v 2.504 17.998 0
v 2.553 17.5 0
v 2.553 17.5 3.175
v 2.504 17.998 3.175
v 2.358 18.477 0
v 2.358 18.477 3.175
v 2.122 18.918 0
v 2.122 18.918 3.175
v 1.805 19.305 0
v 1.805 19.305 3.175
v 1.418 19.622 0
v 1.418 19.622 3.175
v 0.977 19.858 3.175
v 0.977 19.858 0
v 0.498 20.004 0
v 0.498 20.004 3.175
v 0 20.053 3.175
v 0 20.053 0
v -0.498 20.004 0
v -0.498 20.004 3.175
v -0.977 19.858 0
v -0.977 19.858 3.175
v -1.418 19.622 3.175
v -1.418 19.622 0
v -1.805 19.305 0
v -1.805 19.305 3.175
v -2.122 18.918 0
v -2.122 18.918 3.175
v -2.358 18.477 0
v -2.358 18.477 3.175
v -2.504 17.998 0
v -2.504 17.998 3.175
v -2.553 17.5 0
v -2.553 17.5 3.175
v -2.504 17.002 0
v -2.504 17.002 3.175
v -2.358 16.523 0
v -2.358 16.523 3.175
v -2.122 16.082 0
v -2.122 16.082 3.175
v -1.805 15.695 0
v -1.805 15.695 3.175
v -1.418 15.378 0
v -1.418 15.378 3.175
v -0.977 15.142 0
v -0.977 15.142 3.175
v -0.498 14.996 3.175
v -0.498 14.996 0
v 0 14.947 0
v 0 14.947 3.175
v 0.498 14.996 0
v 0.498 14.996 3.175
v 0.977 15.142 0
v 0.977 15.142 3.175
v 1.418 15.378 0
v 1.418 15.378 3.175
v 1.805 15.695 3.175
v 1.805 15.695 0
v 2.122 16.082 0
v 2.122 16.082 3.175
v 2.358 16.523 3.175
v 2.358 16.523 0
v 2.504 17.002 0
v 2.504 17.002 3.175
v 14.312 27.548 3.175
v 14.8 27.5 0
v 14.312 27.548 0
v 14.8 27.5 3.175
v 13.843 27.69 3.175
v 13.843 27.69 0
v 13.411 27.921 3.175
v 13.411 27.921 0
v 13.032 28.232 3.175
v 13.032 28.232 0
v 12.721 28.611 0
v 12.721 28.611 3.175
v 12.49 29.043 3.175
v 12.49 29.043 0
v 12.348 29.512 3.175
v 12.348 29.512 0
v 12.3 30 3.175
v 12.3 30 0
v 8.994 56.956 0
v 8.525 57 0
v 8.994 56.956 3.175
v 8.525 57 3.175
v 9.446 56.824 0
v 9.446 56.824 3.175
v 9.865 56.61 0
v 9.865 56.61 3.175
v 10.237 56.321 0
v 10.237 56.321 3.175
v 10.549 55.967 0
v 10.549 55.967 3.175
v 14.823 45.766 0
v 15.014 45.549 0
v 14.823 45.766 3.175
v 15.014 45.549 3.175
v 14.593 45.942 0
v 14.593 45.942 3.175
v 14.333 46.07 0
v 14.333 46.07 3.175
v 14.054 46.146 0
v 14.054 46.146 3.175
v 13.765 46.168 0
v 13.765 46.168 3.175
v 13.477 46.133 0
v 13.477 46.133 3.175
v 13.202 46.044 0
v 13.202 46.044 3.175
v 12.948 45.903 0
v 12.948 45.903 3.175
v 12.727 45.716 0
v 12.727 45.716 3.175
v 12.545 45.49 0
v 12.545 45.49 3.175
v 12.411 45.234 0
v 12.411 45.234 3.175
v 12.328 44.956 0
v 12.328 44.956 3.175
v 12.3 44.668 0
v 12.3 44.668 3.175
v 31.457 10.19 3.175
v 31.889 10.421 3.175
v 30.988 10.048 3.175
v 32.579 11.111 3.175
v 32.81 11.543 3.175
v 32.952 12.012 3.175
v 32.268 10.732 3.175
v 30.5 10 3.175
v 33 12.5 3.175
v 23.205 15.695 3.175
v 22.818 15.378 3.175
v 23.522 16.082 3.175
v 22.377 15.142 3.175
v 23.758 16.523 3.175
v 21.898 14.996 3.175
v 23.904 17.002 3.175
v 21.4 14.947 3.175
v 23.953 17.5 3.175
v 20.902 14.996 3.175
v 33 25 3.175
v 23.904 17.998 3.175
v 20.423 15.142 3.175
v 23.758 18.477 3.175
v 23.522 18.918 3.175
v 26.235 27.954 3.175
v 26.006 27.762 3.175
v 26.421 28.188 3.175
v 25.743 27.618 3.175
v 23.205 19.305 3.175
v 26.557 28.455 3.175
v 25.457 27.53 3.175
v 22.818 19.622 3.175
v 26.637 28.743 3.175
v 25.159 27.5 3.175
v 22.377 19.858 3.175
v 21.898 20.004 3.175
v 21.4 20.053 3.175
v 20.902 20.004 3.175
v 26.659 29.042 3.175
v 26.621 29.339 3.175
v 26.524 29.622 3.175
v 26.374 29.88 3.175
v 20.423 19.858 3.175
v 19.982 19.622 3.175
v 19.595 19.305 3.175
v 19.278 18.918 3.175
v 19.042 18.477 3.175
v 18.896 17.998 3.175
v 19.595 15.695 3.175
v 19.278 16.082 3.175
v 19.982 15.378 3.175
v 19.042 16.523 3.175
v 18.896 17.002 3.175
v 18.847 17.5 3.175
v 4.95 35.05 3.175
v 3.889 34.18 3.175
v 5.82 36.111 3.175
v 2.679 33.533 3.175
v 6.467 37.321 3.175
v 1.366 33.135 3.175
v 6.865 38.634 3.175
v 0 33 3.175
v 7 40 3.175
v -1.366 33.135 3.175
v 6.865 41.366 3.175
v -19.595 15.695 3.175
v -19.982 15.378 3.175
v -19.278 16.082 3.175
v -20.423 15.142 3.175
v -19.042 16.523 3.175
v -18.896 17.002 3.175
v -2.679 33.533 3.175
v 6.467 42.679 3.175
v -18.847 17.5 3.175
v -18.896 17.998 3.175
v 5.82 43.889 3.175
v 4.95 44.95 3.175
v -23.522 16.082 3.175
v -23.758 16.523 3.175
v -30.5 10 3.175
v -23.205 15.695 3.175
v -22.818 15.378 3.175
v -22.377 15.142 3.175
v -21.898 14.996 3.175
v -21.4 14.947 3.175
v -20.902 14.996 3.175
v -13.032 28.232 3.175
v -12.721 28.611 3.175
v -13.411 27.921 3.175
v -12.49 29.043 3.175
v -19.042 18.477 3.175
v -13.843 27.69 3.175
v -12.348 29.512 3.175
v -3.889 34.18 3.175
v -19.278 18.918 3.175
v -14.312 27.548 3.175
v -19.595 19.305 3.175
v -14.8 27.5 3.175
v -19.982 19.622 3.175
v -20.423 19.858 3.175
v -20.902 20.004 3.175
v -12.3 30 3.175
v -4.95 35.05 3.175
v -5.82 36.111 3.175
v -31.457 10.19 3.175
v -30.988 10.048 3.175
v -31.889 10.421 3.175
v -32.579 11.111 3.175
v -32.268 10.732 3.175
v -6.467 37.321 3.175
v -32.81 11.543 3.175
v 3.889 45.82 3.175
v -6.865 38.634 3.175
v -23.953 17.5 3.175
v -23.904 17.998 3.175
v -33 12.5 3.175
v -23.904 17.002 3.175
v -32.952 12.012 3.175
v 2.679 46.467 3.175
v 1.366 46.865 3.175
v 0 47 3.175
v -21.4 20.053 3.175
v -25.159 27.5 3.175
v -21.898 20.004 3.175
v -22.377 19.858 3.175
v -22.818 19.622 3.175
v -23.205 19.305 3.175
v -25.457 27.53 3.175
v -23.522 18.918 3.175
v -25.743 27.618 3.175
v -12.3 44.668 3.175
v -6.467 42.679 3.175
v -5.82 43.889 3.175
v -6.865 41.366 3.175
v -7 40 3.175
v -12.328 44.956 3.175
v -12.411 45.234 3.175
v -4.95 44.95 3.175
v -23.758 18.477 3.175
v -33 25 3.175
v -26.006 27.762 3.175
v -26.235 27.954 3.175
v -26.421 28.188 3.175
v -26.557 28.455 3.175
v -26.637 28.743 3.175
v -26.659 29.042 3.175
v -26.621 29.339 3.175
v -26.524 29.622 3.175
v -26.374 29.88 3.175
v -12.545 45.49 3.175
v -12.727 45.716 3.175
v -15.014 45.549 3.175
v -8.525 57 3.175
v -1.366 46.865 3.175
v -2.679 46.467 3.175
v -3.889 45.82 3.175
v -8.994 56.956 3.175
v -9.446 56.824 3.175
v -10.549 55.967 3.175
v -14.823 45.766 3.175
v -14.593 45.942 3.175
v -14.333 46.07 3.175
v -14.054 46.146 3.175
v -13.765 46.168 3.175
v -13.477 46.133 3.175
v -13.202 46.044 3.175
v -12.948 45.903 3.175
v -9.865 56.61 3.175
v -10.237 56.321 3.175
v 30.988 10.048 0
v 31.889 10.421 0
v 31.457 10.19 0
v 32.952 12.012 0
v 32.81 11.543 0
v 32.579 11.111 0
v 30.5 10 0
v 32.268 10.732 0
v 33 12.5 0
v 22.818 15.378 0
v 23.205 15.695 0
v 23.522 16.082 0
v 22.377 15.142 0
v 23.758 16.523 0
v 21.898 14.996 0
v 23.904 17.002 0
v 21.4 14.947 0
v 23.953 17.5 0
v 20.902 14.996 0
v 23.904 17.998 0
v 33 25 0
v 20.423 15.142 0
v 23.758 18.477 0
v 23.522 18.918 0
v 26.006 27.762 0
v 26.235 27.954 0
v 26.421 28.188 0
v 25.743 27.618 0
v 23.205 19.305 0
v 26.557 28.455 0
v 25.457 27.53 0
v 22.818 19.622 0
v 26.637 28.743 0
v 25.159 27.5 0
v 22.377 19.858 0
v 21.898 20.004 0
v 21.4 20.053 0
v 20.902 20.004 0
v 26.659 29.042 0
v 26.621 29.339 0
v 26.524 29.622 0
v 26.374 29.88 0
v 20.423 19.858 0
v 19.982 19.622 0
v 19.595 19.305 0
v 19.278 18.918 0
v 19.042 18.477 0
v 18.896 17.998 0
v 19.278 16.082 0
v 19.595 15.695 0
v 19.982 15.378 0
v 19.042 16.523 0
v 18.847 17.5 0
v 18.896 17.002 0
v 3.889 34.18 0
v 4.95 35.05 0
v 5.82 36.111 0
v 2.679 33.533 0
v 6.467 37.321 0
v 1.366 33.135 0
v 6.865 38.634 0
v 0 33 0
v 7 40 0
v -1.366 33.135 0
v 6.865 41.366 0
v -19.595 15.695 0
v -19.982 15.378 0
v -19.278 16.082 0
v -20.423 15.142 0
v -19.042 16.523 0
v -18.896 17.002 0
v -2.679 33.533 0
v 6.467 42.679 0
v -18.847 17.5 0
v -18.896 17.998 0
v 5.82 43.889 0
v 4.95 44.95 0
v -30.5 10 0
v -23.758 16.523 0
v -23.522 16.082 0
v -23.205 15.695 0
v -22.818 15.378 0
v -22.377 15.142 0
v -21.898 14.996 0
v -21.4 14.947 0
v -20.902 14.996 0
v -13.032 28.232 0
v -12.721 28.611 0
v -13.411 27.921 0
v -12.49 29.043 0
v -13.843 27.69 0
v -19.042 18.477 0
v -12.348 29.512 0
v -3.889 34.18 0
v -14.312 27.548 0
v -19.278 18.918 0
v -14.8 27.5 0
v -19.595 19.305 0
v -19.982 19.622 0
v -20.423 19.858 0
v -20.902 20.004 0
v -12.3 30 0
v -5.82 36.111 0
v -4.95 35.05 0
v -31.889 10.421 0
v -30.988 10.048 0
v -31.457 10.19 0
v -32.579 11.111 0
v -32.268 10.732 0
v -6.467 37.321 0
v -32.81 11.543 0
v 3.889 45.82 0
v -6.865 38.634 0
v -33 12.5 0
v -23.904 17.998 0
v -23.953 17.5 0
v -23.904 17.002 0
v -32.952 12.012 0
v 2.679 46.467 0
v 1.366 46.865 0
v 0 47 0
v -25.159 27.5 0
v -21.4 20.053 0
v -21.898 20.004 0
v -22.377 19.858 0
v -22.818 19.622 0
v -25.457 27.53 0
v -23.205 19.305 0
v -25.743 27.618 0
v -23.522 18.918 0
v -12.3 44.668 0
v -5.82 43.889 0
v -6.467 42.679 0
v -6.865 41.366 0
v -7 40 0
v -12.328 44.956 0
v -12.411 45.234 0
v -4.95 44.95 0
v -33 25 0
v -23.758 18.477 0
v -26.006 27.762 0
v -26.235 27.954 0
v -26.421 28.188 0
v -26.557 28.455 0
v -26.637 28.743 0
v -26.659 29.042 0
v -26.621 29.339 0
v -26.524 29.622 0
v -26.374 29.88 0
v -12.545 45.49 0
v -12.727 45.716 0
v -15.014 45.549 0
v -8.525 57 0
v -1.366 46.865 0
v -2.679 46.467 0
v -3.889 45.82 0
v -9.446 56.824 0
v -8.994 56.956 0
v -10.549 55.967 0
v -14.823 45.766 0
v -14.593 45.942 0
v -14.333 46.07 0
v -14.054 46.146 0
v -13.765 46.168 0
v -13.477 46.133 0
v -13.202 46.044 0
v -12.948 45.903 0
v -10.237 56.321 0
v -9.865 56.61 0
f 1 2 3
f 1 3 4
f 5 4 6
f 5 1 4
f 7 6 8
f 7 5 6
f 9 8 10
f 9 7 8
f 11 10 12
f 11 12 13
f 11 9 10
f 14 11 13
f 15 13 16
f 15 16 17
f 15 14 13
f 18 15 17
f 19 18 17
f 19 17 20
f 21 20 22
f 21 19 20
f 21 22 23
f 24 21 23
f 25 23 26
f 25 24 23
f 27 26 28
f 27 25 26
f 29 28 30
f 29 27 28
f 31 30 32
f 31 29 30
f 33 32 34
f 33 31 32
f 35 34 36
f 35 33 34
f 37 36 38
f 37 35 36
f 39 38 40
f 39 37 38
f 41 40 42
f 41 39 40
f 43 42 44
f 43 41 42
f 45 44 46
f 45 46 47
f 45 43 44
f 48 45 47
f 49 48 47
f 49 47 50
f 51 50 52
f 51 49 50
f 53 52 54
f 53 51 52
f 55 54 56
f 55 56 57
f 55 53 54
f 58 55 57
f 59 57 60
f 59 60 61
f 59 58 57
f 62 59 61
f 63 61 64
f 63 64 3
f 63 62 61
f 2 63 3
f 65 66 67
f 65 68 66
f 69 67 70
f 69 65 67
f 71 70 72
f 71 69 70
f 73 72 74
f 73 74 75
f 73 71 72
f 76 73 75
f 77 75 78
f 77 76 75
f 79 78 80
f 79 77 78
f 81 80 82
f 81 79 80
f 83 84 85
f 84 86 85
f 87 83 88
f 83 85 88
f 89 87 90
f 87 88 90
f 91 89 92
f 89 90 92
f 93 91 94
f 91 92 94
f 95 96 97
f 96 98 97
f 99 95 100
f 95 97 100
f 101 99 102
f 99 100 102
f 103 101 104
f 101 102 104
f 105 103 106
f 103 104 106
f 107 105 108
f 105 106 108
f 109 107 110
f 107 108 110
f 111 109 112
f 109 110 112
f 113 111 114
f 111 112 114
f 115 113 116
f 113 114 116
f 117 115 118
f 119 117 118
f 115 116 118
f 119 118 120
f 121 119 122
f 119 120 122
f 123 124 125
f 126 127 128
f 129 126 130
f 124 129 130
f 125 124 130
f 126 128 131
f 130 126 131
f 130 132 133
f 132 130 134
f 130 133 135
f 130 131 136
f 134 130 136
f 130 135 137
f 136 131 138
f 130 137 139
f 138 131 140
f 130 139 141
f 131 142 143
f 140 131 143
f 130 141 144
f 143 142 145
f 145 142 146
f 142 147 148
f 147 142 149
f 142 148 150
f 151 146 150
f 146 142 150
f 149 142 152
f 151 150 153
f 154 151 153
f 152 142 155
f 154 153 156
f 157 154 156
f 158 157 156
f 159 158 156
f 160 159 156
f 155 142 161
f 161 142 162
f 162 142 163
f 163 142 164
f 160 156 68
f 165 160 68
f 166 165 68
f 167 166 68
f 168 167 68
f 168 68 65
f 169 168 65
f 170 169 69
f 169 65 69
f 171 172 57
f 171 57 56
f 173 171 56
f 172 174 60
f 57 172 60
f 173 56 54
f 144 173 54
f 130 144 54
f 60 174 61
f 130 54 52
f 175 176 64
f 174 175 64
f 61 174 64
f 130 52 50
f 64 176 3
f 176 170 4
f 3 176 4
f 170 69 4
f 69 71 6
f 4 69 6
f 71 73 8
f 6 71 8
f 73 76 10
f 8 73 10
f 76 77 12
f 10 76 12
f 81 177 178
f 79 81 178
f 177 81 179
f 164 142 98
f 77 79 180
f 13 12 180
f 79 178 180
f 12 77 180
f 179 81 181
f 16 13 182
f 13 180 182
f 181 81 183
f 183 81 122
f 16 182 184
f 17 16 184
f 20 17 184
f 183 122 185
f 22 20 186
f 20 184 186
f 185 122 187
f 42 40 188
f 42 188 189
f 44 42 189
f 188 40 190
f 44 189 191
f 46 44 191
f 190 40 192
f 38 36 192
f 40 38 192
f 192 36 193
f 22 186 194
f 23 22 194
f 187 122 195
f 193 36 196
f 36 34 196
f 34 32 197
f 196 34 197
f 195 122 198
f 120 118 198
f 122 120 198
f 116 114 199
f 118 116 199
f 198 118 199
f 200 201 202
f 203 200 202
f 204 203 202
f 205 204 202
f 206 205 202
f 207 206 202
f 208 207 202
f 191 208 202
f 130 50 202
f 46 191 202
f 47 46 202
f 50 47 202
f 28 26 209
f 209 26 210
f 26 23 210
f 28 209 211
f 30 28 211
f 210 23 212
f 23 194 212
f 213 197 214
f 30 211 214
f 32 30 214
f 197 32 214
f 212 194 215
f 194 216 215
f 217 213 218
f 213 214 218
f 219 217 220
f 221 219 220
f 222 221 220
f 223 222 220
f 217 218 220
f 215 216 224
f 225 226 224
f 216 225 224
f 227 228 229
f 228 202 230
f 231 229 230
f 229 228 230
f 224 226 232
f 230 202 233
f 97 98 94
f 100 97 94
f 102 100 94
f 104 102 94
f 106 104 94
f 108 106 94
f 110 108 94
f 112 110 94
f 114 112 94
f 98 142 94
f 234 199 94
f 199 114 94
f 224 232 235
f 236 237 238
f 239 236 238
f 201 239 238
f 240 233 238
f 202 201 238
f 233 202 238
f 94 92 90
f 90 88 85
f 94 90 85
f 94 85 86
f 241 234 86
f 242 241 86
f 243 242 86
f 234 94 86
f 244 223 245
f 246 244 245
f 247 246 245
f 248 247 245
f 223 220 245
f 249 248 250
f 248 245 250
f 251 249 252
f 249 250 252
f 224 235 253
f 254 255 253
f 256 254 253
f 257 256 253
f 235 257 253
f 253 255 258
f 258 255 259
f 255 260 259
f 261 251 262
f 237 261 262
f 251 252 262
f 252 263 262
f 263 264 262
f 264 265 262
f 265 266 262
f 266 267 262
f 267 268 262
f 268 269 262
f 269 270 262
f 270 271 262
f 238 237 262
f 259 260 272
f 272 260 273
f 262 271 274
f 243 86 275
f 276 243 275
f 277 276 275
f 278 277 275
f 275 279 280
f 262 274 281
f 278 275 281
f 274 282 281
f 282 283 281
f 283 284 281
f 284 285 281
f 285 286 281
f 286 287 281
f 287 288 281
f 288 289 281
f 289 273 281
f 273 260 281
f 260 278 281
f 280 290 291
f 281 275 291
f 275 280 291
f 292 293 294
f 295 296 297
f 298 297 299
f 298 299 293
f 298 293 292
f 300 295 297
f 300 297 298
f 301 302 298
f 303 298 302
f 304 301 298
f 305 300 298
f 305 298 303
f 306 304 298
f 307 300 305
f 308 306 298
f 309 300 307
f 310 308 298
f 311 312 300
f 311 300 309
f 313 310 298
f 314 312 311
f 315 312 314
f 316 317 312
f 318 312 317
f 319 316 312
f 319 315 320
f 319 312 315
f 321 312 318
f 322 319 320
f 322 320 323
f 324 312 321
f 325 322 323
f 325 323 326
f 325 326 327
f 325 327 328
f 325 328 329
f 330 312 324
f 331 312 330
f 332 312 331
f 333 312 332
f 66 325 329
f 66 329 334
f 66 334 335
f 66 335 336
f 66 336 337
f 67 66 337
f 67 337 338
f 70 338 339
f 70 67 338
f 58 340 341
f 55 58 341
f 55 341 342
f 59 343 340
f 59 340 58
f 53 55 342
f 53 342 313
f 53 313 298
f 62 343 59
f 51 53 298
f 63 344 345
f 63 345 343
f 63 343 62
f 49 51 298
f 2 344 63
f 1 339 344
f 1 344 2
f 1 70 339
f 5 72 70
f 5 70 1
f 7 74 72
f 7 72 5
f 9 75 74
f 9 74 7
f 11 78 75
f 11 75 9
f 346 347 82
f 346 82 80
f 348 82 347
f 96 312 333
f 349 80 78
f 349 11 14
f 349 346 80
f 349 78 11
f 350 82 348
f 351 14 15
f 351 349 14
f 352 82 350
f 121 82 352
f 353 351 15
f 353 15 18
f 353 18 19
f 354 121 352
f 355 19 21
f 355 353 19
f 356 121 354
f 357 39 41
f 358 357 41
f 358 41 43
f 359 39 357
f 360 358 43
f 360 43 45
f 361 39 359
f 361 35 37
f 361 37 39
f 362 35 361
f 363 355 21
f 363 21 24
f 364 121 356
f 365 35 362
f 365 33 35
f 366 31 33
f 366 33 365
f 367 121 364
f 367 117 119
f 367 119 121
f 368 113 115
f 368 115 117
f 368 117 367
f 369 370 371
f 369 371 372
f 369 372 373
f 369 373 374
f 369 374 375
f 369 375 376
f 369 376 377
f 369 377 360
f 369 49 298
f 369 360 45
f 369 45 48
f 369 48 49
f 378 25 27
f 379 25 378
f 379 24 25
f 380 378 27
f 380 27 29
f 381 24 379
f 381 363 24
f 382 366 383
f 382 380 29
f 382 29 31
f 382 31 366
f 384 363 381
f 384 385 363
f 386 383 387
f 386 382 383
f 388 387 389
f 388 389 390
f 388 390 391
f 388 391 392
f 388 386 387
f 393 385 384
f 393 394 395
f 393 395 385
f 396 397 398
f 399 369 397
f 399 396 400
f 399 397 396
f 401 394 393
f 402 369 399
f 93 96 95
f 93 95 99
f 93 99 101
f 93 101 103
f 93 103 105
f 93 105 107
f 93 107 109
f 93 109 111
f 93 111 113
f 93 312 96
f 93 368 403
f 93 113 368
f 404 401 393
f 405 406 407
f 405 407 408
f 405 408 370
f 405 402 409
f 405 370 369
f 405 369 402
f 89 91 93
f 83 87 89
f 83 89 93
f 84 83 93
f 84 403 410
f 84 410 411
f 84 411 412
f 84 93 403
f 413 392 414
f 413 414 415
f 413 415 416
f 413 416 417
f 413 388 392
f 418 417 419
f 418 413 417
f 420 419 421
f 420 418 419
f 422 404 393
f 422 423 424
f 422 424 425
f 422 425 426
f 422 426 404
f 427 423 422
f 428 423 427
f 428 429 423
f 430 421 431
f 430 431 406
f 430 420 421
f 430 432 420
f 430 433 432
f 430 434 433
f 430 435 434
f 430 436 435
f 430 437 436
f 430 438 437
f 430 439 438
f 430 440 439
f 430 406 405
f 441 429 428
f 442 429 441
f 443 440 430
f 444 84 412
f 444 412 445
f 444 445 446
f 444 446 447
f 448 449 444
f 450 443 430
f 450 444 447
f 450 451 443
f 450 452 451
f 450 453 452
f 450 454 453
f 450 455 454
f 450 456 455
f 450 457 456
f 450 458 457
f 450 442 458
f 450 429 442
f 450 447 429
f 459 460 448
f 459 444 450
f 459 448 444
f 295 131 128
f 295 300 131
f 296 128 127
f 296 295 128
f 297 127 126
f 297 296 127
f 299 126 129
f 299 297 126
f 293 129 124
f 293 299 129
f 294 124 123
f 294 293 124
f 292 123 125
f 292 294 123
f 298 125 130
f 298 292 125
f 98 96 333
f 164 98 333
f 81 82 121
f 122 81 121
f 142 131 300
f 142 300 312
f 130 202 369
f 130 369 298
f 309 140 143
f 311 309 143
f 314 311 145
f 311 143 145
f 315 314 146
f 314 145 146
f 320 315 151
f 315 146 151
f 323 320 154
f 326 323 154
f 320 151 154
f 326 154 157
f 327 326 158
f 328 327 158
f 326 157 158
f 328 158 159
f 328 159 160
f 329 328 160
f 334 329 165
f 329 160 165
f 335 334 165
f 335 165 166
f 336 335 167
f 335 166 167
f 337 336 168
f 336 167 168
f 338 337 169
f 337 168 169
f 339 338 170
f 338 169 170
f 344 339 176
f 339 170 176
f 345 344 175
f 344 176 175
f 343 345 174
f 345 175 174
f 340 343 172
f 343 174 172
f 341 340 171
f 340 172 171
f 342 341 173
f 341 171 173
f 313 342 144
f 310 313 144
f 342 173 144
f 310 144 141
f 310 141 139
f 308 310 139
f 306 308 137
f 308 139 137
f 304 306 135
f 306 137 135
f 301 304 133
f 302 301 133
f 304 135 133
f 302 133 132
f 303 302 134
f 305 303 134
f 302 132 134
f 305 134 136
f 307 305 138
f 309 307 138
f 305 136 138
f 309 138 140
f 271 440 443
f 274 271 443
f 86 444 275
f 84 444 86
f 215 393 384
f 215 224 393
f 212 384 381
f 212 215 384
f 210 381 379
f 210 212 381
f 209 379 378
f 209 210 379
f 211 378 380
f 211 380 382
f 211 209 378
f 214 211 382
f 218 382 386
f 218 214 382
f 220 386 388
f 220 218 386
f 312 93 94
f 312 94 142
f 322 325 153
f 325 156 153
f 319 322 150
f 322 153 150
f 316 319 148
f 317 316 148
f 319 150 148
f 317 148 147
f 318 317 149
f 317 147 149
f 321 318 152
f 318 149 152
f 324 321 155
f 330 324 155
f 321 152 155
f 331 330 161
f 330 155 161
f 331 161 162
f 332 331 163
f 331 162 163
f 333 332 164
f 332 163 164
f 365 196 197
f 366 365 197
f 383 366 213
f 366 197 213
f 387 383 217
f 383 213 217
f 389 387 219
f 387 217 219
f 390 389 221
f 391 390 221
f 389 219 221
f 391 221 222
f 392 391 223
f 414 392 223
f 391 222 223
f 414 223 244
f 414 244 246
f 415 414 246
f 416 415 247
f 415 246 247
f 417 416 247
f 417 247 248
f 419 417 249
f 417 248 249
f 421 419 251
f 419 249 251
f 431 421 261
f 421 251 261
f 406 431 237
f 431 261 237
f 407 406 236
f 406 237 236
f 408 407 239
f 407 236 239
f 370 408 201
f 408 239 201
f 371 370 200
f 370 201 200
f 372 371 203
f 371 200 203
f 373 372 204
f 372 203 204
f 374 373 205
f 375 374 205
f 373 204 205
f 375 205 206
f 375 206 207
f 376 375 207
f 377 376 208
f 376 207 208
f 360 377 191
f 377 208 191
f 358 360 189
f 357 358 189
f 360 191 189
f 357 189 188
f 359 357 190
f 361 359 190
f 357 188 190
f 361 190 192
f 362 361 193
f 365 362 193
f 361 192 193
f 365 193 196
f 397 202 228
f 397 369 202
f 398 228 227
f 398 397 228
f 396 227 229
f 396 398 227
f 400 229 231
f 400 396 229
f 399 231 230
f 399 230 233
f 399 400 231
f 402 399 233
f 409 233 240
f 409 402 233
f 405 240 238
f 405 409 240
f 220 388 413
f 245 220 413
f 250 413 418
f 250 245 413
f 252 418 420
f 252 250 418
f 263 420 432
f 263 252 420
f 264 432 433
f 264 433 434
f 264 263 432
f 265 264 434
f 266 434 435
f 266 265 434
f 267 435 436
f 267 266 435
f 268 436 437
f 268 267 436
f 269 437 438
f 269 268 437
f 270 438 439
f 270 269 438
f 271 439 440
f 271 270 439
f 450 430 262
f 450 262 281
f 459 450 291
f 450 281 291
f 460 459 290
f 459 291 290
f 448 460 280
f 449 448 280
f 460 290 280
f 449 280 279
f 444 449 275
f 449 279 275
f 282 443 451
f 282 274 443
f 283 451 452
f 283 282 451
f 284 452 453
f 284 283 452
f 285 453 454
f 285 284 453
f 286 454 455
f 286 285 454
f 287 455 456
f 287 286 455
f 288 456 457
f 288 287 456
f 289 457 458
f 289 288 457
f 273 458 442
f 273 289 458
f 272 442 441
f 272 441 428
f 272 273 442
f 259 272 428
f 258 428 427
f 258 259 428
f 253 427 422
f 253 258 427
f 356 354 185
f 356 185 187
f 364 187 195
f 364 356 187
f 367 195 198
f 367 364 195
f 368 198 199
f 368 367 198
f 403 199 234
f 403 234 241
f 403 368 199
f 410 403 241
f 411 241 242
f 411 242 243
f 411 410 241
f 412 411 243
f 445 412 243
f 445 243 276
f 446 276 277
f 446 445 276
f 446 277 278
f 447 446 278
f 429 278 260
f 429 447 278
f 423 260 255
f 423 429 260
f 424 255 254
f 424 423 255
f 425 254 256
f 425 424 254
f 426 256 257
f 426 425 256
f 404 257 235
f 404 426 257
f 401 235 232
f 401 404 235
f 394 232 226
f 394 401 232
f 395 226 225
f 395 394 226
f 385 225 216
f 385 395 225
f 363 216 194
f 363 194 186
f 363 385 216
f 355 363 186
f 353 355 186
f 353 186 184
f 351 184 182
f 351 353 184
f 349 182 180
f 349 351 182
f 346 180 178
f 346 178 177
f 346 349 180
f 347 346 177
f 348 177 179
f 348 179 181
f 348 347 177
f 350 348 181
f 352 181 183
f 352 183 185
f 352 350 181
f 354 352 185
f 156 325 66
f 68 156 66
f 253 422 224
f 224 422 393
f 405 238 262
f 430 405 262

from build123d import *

# Parameters (mm, degrees)
SKETCH1_W           = 19.6
SKETCH1_H           = 47
SKETCH1_R           = 2.5527
SKETCH1_R_2         = 7
BOSS_EXTRUDE1_DEPTH = 3.175
SKETCH2_W           = 23.2
SKETCH2_H           = 15
SKETCH2_R           = 2.5527
BOSS_EXTRUDE2_DEPTH = 3.175
BOSS_EXTRUDE3_DEPTH = 3.175
FILLET1_R           = 2.5
FILLET2_R           = 1.5
FILLET3_R           = 2.5


with BuildPart() as part:
    # Sketch1 → Boss-Extrude1 (new body)
    with BuildSketch(Plane.XY):
        with Locations((0, 33.5)):
            Rectangle(SKETCH1_W, SKETCH1_H)
        with Locations((0, 17.5)):
            Circle(SKETCH1_R, mode=Mode.SUBTRACT)
        with Locations((0, 40)):
            Circle(SKETCH1_R_2, mode=Mode.SUBTRACT)
    extrude(amount=BOSS_EXTRUDE1_DEPTH)

    # Sketch2 → Boss-Extrude2 (add)
    # profile 1 of 2: a face of its own
    with BuildSketch(Plane.XY.offset(3.175)):
        with Locations((21.4, 17.5)):
            Rectangle(SKETCH2_W, SKETCH2_H)
        with Locations((21.4, 17.5)):
            Circle(SKETCH2_R, mode=Mode.SUBTRACT)
    # profile 2 of 2: a face of its own
    with BuildSketch(Plane.XY.offset(3.175)):
        with Locations((-21.4, 17.5)):
            Rectangle(SKETCH2_W, SKETCH2_H)
        with Locations((-21.4, 17.5)):
            Circle(SKETCH2_R, mode=Mode.SUBTRACT)
    extrude(amount=-BOSS_EXTRUDE2_DEPTH)

    # Sketch3 → Boss-Extrude3 (add)
    # profile 1 of 2: a face of its own
    with BuildSketch(Plane(origin=(0, 0, 0), x_dir=(-1, 0, 0), z_dir=(0, 0, -1))):
        Polygon((33, 25), (9.8, 57), (9.8, 25), align=None)
        Polygon((28.099595168, 27.5), (12.3, 49.29254506), (12.3, 27.5), align=None, mode=Mode.SUBTRACT)
    # profile 2 of 2: a face of its own
    with BuildSketch(Plane(origin=(0, 0, 0), x_dir=(-1, 0, 0), z_dir=(0, 0, -1))):
        Polygon((-9.8, 57), (-33, 25), (-9.8, 25), align=None)
        Polygon((-12.3, 49.29254506), (-28.099595168, 27.5), (-12.3, 27.5), align=None, mode=Mode.SUBTRACT)
    extrude(amount=-BOSS_EXTRUDE3_DEPTH)

    # Fillet1
    fillet1_edges = [part.edges().sort_by_distance(p)[0] for p in [
        (-12.3, 27.5, 1.5875),
        (12.3, 27.5, 1.5875),
    ]]
    fillet(fillet1_edges, radius=FILLET1_R)

    # Fillet2
    fillet2_edges = [part.edges().sort_by_distance(p)[0] for p in [
        (-12.3, 49.29254506, 1.5875),
        (-28.099595168, 27.5, 1.5875),
        (28.099595168, 27.5, 1.5875),
        (12.3, 49.29254506, 1.5875),
    ]]
    fillet(fillet2_edges, radius=FILLET2_R)

    # Fillet3
    fillet3_edges = [part.edges().sort_by_distance(p)[0] for p in [
        (-9.8, 57, 1.5875),
        (9.8, 57, 1.5875),
        (33, 10, 1.5875),
        (-33, 10, 1.5875),
    ]]
    fillet(fillet3_edges, radius=FILLET3_R)


solid = part.part
